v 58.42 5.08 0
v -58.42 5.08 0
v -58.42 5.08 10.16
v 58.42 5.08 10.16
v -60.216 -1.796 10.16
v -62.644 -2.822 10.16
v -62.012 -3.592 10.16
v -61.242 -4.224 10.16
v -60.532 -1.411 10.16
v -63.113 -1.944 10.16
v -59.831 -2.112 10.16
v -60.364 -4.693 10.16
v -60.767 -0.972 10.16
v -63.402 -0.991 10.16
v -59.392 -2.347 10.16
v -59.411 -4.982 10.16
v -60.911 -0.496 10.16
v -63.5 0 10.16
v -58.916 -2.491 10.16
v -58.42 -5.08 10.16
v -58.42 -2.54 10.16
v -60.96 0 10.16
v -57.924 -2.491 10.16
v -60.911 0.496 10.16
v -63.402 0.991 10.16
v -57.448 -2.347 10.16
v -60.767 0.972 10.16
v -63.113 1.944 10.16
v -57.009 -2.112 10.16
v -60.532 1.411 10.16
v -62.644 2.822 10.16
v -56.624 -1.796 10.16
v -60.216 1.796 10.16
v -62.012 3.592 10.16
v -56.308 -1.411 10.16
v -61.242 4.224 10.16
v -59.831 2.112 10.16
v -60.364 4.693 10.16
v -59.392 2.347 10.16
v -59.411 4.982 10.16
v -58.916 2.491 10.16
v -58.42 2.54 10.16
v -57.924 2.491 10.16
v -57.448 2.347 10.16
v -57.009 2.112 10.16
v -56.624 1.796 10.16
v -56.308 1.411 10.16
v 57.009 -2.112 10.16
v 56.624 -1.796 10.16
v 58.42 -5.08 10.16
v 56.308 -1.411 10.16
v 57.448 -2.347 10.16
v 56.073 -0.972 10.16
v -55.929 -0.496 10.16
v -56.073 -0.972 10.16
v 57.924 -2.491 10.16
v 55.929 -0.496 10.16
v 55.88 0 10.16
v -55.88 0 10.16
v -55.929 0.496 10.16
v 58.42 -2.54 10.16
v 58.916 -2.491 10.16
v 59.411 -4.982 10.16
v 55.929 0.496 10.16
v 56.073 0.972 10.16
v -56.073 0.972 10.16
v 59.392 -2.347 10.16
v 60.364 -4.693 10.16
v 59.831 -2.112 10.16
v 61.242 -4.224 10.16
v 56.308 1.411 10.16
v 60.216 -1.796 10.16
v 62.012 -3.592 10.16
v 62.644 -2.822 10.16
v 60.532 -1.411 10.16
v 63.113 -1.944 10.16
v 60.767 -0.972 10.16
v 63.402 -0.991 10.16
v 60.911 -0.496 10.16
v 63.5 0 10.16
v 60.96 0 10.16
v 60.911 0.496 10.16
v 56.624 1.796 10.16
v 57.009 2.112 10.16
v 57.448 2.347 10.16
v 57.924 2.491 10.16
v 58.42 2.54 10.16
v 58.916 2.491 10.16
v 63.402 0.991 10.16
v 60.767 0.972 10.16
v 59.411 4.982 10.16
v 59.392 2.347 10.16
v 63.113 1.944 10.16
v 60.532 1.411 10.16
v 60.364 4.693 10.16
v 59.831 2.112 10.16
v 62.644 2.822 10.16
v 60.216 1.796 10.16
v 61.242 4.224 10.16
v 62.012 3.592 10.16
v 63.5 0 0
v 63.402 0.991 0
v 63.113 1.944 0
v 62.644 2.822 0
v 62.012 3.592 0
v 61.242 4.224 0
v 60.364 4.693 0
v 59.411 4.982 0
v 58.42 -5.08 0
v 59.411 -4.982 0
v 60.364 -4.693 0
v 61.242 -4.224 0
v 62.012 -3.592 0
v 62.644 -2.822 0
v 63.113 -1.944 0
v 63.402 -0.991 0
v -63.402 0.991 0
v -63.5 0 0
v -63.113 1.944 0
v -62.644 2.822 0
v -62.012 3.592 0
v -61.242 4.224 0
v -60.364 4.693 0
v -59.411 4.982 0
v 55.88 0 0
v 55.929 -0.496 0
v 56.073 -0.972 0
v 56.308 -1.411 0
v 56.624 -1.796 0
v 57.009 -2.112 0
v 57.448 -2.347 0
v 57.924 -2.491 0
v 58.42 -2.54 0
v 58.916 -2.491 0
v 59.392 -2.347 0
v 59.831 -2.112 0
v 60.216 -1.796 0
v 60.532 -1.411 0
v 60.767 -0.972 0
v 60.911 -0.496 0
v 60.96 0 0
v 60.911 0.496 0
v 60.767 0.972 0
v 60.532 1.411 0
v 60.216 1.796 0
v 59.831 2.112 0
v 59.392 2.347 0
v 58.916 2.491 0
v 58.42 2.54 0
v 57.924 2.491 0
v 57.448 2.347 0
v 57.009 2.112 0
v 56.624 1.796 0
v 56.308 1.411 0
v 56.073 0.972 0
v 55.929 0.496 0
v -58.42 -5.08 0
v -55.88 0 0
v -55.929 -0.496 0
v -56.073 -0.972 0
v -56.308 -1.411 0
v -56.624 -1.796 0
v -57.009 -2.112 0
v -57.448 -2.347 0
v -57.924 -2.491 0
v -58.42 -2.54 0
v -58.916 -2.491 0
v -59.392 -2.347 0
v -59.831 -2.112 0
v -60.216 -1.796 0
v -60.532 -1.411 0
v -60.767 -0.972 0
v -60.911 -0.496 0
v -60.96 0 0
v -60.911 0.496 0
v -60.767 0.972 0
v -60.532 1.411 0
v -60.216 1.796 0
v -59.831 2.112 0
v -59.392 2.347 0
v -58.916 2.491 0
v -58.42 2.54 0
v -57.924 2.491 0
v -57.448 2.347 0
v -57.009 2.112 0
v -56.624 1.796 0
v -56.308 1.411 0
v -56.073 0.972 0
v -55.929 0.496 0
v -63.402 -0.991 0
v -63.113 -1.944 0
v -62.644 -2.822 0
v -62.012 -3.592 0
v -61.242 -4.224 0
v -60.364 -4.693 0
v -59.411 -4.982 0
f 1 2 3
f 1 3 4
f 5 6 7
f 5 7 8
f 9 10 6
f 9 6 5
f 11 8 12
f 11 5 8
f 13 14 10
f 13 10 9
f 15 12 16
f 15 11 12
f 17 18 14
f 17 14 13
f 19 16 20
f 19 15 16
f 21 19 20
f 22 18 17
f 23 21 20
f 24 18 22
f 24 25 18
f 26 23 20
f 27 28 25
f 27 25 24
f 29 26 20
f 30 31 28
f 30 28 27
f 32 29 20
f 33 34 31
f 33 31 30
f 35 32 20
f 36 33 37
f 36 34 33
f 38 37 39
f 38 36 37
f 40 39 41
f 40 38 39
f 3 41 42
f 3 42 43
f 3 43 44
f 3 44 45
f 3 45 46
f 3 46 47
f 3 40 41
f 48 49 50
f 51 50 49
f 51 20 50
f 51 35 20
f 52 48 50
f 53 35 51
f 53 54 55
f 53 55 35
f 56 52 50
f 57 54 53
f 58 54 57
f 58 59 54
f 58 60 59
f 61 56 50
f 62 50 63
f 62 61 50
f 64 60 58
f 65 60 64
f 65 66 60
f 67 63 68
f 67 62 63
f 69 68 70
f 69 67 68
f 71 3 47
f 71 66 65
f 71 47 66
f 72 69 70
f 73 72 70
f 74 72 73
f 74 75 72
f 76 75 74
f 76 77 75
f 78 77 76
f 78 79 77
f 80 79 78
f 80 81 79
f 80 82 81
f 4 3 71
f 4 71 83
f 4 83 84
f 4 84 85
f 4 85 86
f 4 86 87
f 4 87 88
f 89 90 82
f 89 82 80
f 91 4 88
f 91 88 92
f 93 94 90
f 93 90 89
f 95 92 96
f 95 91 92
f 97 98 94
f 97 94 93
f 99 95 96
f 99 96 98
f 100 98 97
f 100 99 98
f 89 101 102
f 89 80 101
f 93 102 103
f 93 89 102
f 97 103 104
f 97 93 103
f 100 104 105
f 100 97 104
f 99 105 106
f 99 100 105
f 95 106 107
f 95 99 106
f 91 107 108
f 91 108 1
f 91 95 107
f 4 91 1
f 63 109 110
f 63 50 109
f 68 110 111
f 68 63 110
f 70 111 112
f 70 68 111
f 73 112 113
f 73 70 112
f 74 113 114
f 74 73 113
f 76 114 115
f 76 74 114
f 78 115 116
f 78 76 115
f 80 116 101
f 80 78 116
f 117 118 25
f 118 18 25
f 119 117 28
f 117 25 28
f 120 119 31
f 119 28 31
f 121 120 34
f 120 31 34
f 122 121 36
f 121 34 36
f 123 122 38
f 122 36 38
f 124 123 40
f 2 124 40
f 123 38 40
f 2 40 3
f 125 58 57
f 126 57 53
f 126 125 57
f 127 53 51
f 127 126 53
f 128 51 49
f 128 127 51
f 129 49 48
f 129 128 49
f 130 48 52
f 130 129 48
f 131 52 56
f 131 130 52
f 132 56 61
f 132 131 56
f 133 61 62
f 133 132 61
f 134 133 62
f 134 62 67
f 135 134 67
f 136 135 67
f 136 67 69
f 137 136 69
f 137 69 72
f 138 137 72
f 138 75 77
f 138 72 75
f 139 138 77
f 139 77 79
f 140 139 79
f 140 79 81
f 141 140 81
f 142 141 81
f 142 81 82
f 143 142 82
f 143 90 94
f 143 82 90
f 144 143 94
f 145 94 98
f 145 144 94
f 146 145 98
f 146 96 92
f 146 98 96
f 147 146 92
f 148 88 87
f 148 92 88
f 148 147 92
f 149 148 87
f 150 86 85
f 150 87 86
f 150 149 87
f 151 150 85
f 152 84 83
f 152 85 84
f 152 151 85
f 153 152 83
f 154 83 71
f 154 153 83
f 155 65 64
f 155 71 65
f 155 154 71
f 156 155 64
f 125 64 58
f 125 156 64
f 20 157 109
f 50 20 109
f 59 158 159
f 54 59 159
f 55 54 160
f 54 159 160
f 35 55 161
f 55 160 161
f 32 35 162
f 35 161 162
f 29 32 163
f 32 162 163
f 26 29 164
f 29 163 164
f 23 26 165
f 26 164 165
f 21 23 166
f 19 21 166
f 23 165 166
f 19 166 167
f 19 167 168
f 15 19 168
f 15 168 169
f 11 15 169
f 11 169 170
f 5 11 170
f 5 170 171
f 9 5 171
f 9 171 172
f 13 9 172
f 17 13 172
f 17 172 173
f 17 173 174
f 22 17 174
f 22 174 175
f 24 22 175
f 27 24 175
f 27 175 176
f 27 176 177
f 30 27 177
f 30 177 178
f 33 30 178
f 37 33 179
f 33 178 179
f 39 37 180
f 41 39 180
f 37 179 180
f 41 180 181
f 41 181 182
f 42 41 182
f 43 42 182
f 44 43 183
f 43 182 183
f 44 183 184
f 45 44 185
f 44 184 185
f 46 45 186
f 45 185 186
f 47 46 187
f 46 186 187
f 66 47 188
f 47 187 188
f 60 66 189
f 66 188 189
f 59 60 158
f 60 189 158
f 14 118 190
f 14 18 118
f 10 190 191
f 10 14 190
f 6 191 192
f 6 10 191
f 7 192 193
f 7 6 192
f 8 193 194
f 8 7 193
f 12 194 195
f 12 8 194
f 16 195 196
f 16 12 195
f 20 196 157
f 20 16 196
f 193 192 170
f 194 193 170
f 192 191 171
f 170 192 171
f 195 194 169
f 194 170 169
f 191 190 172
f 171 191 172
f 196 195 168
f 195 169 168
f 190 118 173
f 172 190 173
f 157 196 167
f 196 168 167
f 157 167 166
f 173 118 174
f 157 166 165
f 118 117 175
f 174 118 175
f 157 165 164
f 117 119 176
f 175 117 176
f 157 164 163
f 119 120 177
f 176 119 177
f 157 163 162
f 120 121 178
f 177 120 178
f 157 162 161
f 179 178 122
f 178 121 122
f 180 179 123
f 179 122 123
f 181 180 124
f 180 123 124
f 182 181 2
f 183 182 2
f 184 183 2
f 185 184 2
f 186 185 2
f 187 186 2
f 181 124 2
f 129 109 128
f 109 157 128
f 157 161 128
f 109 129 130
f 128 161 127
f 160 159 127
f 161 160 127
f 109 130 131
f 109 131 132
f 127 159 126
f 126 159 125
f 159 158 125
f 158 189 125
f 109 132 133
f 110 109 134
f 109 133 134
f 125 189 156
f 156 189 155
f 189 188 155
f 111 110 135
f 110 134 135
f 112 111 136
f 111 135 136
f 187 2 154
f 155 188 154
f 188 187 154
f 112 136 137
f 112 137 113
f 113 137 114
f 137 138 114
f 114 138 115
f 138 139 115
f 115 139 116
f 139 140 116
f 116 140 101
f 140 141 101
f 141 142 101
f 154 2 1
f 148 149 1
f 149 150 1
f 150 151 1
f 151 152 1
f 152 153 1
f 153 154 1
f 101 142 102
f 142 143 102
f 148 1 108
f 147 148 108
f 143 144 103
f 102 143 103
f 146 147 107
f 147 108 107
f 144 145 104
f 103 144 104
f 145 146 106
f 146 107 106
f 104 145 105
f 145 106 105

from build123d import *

# Parameters (mm, degrees)
F0_W     = 127
F0_H     = 10.16
F1_DEPTH = 10.16
F2_R     = 5.07999
F3_R     = 2.54
F4_DEPTH = 25.4


# Not quite as in the source:
# - a fillet or chamfer is up to 0.001 mm smaller than in the source, because OpenCascade refuses the exact size
# - a pattern or mirror of a feature is missing from the dataset's text; its kind, count and spacing are read off the source's solid


with BuildPart() as f1:
    # F0 (on Top) → F1 (new body)
    with BuildSketch(Plane.XY):
        Rectangle(F0_W, F0_H)
    extrude(amount=F1_DEPTH)

    # F2 (radius 5.08 in the source; OpenCascade refuses exactly that, so slightly less here)
    f2_edges = [f1.edges().sort_by_distance(p)[0] for p in [
        (-63.5, -5.08, 5.08),
        (-63.5, 5.08, 5.08),
        (63.5, -5.08, 5.08),
        (63.5, 5.08, 5.08),
    ]]
    fillet(f2_edges, radius=F2_R)

    # F3 (on face) → F4 (cut)
    with BuildSketch(Plane(origin=(0, 0, 0), x_dir=(1, 0, 0), z_dir=(0, 0, -1))):
        with Locations((-58.42, 0)):
            Circle(F3_R)
    f4 = extrude(amount=-F4_DEPTH, mode=Mode.SUBTRACT)

    # F4_copies: F4 across plane
    add(f4.mirror(Plane(origin=(0, 0, 0), x_dir=(0, 0, 1), z_dir=(1, 0, 0))), mode=Mode.SUBTRACT)


solid = f1.part
